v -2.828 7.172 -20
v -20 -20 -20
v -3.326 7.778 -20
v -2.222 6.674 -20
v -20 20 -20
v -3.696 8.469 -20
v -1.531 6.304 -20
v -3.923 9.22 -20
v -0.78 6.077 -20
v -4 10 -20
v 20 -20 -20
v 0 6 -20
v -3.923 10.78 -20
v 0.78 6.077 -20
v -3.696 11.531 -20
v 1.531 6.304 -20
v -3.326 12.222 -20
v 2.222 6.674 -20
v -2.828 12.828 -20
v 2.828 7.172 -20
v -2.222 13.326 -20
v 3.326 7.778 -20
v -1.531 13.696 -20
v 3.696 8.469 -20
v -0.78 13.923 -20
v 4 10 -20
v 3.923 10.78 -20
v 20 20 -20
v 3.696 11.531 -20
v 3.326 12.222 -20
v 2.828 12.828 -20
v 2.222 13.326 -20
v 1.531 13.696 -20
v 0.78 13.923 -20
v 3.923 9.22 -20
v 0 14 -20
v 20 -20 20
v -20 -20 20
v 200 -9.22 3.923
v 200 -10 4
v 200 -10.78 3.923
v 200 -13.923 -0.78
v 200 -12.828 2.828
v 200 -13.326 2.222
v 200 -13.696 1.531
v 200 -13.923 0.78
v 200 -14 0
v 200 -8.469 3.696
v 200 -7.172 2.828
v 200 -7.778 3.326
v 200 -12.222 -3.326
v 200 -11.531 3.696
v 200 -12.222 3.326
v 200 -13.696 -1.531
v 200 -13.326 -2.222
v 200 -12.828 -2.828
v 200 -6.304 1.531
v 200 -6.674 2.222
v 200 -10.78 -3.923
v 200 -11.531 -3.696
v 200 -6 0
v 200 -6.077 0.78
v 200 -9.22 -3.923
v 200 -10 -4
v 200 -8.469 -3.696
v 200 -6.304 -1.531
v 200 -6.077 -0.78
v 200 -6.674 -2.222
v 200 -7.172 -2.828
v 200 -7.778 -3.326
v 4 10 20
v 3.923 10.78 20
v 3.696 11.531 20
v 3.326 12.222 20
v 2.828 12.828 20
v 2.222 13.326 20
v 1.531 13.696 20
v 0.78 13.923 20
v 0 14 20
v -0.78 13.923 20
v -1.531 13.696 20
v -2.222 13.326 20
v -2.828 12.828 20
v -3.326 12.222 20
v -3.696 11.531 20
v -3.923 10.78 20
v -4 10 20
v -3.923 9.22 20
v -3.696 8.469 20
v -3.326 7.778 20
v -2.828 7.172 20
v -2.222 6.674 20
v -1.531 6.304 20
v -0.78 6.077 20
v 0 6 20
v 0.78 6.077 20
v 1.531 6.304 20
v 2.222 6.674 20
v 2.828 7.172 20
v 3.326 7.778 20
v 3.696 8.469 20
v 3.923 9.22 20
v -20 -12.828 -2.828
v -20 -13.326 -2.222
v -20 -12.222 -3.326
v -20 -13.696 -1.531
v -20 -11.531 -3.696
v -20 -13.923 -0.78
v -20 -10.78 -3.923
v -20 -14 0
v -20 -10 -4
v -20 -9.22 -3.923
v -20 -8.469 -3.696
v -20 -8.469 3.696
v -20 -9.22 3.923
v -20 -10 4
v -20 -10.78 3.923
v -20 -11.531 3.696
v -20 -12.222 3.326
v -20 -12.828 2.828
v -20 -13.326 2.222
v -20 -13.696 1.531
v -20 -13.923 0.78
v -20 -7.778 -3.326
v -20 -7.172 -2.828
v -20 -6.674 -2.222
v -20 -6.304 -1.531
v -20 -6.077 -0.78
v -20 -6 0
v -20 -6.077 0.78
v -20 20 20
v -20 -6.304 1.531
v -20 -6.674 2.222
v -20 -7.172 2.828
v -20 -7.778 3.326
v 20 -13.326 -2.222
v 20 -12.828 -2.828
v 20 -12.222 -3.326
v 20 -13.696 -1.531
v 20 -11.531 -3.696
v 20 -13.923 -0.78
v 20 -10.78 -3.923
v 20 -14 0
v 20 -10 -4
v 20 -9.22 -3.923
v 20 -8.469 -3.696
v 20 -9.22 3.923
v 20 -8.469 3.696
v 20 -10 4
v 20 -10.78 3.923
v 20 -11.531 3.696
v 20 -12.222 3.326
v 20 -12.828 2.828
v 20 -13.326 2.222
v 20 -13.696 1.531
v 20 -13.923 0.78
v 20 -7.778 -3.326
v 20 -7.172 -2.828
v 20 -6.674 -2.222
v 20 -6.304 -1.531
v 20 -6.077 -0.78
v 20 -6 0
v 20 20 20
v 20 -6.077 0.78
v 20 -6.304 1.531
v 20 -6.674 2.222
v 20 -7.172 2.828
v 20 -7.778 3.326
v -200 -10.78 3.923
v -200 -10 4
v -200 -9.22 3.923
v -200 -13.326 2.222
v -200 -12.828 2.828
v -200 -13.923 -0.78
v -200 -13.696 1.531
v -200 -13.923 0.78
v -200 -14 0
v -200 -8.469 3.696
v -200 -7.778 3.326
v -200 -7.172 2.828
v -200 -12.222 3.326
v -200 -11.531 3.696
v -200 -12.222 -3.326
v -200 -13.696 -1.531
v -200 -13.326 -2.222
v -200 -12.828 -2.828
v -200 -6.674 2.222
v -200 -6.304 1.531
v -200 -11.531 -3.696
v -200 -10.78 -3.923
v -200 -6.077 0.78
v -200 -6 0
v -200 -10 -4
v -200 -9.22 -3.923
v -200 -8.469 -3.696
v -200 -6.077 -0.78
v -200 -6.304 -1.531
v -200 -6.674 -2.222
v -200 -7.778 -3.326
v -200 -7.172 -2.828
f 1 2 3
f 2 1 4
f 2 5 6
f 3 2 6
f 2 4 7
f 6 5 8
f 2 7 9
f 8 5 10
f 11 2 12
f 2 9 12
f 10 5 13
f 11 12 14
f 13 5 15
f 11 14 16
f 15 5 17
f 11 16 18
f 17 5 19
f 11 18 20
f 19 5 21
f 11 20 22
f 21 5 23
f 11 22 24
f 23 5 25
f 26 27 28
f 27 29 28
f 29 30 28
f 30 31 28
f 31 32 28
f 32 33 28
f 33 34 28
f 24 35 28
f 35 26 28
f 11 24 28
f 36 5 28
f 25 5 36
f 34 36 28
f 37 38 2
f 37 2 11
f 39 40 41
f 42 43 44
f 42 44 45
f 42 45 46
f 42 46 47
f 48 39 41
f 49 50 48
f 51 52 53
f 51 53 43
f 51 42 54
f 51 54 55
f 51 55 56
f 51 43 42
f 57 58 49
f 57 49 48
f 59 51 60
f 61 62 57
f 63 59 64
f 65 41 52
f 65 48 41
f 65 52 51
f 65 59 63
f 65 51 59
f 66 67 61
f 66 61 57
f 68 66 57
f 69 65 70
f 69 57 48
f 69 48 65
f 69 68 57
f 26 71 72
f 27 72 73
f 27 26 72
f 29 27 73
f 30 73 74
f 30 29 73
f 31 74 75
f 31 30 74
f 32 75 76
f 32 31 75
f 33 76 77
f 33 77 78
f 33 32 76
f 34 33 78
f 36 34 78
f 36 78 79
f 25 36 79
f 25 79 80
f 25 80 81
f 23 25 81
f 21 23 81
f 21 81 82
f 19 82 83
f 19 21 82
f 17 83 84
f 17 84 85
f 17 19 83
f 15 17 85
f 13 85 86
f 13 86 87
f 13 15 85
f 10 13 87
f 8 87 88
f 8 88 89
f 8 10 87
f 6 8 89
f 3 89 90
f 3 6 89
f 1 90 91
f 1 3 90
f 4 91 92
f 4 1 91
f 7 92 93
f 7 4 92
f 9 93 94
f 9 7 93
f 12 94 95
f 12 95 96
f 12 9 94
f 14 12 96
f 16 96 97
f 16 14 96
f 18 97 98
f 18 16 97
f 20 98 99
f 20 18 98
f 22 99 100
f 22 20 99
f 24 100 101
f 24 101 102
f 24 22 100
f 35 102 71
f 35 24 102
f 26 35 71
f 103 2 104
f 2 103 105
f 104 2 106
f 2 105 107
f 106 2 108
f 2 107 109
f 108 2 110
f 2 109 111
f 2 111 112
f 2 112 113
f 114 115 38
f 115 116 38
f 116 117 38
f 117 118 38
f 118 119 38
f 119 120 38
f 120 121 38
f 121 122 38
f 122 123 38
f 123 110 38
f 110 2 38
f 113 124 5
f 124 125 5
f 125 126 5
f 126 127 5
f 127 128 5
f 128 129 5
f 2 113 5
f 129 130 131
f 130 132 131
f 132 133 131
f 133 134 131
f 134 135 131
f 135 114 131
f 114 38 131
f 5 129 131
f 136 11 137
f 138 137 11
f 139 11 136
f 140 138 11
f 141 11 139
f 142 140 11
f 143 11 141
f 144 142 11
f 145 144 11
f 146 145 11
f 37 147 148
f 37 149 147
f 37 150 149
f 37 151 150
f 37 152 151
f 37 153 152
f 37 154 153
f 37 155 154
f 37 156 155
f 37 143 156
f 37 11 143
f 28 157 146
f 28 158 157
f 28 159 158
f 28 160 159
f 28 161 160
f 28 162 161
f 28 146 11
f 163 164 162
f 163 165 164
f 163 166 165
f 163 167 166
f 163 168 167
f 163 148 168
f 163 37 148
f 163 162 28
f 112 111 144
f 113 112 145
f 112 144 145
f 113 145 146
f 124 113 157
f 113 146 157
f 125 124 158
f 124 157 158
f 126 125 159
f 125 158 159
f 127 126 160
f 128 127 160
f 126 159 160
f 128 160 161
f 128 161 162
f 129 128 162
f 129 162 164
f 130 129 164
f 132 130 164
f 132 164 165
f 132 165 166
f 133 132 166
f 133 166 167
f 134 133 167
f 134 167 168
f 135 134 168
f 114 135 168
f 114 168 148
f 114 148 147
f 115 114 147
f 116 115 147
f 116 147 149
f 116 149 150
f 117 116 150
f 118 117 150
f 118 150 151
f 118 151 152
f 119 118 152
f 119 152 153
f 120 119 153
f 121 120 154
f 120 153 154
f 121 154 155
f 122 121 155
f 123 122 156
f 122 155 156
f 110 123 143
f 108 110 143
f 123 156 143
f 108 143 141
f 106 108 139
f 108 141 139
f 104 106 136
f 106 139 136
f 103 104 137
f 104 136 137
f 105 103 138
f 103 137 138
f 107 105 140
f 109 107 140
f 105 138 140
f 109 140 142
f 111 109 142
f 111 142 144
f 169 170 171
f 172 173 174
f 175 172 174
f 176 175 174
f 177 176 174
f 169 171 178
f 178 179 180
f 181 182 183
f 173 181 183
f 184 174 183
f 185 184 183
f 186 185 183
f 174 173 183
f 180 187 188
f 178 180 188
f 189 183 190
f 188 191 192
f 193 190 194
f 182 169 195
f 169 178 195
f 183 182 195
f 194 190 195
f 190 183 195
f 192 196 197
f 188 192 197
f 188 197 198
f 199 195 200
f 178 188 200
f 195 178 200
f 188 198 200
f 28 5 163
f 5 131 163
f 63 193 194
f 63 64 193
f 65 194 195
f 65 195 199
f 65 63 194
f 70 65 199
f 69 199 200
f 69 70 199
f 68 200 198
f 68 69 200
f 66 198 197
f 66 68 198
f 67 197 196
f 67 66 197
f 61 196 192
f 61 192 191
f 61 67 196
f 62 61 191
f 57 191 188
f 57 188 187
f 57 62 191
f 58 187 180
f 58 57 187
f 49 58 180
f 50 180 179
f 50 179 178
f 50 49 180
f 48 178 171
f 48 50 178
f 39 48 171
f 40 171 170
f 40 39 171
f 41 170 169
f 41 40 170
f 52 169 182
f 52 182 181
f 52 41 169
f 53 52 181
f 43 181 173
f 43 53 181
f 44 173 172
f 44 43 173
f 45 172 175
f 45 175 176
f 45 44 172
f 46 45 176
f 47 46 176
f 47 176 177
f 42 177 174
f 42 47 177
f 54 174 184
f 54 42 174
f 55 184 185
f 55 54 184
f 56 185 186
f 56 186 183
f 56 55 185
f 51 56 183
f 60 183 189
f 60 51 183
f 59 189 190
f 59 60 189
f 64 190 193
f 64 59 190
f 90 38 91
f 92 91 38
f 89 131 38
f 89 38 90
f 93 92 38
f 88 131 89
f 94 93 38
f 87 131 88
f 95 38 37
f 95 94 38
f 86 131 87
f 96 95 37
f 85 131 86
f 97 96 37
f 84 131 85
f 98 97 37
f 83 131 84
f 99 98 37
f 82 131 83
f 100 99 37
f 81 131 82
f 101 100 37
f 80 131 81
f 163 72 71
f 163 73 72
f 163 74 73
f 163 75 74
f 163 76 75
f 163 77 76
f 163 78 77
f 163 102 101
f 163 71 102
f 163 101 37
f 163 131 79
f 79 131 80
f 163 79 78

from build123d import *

# Parameters (mm, degrees)
ESQUISSE1_W             = 40
ESQUISSE1_H             = 40
ESQUISSE1_R             = 4
BOSS_EXTRU_1_DEPTH      = 20
ESQUISSE2_R             = 4
ENL_V_MAT_EXTRU_1_DEPTH = 49.989794856
ESQUISSE3_R             = 4
BOSS_EXTRU_2_DEPTH      = 200


with BuildPart() as part:
    # Esquisse1 → Boss.-Extru.1 (new, symmetric)
    with BuildSketch(Plane.XY):
        Rectangle(ESQUISSE1_W, ESQUISSE1_H)
        with Locations((0, 10)):
            Circle(ESQUISSE1_R, mode=Mode.SUBTRACT)
    extrude(amount=BOSS_EXTRU_1_DEPTH, both=True)

    # Esquisse2 → Enlèv. mat.-Extru.1 (cut, through all)
    with BuildSketch(Plane(origin=(20, 0, 0), x_dir=(0, 0, -1), z_dir=(1, 0, 0))):
        with Locations((0, -10)):
            Circle(ESQUISSE2_R)
    extrude(amount=-ENL_V_MAT_EXTRU_1_DEPTH, mode=Mode.SUBTRACT)


with BuildPart() as body_2:
    # Esquisse3 → Boss.-Extru.2 (new, symmetric)
    with BuildSketch(Plane(origin=(0, 0, 0), x_dir=(0, 0, -1), z_dir=(1, 0, 0))):
        with Locations((0, -10)):
            Circle(ESQUISSE3_R)
    extrude(amount=BOSS_EXTRU_2_DEPTH, both=True)


solid = Compound([part.part, body_2.part])
